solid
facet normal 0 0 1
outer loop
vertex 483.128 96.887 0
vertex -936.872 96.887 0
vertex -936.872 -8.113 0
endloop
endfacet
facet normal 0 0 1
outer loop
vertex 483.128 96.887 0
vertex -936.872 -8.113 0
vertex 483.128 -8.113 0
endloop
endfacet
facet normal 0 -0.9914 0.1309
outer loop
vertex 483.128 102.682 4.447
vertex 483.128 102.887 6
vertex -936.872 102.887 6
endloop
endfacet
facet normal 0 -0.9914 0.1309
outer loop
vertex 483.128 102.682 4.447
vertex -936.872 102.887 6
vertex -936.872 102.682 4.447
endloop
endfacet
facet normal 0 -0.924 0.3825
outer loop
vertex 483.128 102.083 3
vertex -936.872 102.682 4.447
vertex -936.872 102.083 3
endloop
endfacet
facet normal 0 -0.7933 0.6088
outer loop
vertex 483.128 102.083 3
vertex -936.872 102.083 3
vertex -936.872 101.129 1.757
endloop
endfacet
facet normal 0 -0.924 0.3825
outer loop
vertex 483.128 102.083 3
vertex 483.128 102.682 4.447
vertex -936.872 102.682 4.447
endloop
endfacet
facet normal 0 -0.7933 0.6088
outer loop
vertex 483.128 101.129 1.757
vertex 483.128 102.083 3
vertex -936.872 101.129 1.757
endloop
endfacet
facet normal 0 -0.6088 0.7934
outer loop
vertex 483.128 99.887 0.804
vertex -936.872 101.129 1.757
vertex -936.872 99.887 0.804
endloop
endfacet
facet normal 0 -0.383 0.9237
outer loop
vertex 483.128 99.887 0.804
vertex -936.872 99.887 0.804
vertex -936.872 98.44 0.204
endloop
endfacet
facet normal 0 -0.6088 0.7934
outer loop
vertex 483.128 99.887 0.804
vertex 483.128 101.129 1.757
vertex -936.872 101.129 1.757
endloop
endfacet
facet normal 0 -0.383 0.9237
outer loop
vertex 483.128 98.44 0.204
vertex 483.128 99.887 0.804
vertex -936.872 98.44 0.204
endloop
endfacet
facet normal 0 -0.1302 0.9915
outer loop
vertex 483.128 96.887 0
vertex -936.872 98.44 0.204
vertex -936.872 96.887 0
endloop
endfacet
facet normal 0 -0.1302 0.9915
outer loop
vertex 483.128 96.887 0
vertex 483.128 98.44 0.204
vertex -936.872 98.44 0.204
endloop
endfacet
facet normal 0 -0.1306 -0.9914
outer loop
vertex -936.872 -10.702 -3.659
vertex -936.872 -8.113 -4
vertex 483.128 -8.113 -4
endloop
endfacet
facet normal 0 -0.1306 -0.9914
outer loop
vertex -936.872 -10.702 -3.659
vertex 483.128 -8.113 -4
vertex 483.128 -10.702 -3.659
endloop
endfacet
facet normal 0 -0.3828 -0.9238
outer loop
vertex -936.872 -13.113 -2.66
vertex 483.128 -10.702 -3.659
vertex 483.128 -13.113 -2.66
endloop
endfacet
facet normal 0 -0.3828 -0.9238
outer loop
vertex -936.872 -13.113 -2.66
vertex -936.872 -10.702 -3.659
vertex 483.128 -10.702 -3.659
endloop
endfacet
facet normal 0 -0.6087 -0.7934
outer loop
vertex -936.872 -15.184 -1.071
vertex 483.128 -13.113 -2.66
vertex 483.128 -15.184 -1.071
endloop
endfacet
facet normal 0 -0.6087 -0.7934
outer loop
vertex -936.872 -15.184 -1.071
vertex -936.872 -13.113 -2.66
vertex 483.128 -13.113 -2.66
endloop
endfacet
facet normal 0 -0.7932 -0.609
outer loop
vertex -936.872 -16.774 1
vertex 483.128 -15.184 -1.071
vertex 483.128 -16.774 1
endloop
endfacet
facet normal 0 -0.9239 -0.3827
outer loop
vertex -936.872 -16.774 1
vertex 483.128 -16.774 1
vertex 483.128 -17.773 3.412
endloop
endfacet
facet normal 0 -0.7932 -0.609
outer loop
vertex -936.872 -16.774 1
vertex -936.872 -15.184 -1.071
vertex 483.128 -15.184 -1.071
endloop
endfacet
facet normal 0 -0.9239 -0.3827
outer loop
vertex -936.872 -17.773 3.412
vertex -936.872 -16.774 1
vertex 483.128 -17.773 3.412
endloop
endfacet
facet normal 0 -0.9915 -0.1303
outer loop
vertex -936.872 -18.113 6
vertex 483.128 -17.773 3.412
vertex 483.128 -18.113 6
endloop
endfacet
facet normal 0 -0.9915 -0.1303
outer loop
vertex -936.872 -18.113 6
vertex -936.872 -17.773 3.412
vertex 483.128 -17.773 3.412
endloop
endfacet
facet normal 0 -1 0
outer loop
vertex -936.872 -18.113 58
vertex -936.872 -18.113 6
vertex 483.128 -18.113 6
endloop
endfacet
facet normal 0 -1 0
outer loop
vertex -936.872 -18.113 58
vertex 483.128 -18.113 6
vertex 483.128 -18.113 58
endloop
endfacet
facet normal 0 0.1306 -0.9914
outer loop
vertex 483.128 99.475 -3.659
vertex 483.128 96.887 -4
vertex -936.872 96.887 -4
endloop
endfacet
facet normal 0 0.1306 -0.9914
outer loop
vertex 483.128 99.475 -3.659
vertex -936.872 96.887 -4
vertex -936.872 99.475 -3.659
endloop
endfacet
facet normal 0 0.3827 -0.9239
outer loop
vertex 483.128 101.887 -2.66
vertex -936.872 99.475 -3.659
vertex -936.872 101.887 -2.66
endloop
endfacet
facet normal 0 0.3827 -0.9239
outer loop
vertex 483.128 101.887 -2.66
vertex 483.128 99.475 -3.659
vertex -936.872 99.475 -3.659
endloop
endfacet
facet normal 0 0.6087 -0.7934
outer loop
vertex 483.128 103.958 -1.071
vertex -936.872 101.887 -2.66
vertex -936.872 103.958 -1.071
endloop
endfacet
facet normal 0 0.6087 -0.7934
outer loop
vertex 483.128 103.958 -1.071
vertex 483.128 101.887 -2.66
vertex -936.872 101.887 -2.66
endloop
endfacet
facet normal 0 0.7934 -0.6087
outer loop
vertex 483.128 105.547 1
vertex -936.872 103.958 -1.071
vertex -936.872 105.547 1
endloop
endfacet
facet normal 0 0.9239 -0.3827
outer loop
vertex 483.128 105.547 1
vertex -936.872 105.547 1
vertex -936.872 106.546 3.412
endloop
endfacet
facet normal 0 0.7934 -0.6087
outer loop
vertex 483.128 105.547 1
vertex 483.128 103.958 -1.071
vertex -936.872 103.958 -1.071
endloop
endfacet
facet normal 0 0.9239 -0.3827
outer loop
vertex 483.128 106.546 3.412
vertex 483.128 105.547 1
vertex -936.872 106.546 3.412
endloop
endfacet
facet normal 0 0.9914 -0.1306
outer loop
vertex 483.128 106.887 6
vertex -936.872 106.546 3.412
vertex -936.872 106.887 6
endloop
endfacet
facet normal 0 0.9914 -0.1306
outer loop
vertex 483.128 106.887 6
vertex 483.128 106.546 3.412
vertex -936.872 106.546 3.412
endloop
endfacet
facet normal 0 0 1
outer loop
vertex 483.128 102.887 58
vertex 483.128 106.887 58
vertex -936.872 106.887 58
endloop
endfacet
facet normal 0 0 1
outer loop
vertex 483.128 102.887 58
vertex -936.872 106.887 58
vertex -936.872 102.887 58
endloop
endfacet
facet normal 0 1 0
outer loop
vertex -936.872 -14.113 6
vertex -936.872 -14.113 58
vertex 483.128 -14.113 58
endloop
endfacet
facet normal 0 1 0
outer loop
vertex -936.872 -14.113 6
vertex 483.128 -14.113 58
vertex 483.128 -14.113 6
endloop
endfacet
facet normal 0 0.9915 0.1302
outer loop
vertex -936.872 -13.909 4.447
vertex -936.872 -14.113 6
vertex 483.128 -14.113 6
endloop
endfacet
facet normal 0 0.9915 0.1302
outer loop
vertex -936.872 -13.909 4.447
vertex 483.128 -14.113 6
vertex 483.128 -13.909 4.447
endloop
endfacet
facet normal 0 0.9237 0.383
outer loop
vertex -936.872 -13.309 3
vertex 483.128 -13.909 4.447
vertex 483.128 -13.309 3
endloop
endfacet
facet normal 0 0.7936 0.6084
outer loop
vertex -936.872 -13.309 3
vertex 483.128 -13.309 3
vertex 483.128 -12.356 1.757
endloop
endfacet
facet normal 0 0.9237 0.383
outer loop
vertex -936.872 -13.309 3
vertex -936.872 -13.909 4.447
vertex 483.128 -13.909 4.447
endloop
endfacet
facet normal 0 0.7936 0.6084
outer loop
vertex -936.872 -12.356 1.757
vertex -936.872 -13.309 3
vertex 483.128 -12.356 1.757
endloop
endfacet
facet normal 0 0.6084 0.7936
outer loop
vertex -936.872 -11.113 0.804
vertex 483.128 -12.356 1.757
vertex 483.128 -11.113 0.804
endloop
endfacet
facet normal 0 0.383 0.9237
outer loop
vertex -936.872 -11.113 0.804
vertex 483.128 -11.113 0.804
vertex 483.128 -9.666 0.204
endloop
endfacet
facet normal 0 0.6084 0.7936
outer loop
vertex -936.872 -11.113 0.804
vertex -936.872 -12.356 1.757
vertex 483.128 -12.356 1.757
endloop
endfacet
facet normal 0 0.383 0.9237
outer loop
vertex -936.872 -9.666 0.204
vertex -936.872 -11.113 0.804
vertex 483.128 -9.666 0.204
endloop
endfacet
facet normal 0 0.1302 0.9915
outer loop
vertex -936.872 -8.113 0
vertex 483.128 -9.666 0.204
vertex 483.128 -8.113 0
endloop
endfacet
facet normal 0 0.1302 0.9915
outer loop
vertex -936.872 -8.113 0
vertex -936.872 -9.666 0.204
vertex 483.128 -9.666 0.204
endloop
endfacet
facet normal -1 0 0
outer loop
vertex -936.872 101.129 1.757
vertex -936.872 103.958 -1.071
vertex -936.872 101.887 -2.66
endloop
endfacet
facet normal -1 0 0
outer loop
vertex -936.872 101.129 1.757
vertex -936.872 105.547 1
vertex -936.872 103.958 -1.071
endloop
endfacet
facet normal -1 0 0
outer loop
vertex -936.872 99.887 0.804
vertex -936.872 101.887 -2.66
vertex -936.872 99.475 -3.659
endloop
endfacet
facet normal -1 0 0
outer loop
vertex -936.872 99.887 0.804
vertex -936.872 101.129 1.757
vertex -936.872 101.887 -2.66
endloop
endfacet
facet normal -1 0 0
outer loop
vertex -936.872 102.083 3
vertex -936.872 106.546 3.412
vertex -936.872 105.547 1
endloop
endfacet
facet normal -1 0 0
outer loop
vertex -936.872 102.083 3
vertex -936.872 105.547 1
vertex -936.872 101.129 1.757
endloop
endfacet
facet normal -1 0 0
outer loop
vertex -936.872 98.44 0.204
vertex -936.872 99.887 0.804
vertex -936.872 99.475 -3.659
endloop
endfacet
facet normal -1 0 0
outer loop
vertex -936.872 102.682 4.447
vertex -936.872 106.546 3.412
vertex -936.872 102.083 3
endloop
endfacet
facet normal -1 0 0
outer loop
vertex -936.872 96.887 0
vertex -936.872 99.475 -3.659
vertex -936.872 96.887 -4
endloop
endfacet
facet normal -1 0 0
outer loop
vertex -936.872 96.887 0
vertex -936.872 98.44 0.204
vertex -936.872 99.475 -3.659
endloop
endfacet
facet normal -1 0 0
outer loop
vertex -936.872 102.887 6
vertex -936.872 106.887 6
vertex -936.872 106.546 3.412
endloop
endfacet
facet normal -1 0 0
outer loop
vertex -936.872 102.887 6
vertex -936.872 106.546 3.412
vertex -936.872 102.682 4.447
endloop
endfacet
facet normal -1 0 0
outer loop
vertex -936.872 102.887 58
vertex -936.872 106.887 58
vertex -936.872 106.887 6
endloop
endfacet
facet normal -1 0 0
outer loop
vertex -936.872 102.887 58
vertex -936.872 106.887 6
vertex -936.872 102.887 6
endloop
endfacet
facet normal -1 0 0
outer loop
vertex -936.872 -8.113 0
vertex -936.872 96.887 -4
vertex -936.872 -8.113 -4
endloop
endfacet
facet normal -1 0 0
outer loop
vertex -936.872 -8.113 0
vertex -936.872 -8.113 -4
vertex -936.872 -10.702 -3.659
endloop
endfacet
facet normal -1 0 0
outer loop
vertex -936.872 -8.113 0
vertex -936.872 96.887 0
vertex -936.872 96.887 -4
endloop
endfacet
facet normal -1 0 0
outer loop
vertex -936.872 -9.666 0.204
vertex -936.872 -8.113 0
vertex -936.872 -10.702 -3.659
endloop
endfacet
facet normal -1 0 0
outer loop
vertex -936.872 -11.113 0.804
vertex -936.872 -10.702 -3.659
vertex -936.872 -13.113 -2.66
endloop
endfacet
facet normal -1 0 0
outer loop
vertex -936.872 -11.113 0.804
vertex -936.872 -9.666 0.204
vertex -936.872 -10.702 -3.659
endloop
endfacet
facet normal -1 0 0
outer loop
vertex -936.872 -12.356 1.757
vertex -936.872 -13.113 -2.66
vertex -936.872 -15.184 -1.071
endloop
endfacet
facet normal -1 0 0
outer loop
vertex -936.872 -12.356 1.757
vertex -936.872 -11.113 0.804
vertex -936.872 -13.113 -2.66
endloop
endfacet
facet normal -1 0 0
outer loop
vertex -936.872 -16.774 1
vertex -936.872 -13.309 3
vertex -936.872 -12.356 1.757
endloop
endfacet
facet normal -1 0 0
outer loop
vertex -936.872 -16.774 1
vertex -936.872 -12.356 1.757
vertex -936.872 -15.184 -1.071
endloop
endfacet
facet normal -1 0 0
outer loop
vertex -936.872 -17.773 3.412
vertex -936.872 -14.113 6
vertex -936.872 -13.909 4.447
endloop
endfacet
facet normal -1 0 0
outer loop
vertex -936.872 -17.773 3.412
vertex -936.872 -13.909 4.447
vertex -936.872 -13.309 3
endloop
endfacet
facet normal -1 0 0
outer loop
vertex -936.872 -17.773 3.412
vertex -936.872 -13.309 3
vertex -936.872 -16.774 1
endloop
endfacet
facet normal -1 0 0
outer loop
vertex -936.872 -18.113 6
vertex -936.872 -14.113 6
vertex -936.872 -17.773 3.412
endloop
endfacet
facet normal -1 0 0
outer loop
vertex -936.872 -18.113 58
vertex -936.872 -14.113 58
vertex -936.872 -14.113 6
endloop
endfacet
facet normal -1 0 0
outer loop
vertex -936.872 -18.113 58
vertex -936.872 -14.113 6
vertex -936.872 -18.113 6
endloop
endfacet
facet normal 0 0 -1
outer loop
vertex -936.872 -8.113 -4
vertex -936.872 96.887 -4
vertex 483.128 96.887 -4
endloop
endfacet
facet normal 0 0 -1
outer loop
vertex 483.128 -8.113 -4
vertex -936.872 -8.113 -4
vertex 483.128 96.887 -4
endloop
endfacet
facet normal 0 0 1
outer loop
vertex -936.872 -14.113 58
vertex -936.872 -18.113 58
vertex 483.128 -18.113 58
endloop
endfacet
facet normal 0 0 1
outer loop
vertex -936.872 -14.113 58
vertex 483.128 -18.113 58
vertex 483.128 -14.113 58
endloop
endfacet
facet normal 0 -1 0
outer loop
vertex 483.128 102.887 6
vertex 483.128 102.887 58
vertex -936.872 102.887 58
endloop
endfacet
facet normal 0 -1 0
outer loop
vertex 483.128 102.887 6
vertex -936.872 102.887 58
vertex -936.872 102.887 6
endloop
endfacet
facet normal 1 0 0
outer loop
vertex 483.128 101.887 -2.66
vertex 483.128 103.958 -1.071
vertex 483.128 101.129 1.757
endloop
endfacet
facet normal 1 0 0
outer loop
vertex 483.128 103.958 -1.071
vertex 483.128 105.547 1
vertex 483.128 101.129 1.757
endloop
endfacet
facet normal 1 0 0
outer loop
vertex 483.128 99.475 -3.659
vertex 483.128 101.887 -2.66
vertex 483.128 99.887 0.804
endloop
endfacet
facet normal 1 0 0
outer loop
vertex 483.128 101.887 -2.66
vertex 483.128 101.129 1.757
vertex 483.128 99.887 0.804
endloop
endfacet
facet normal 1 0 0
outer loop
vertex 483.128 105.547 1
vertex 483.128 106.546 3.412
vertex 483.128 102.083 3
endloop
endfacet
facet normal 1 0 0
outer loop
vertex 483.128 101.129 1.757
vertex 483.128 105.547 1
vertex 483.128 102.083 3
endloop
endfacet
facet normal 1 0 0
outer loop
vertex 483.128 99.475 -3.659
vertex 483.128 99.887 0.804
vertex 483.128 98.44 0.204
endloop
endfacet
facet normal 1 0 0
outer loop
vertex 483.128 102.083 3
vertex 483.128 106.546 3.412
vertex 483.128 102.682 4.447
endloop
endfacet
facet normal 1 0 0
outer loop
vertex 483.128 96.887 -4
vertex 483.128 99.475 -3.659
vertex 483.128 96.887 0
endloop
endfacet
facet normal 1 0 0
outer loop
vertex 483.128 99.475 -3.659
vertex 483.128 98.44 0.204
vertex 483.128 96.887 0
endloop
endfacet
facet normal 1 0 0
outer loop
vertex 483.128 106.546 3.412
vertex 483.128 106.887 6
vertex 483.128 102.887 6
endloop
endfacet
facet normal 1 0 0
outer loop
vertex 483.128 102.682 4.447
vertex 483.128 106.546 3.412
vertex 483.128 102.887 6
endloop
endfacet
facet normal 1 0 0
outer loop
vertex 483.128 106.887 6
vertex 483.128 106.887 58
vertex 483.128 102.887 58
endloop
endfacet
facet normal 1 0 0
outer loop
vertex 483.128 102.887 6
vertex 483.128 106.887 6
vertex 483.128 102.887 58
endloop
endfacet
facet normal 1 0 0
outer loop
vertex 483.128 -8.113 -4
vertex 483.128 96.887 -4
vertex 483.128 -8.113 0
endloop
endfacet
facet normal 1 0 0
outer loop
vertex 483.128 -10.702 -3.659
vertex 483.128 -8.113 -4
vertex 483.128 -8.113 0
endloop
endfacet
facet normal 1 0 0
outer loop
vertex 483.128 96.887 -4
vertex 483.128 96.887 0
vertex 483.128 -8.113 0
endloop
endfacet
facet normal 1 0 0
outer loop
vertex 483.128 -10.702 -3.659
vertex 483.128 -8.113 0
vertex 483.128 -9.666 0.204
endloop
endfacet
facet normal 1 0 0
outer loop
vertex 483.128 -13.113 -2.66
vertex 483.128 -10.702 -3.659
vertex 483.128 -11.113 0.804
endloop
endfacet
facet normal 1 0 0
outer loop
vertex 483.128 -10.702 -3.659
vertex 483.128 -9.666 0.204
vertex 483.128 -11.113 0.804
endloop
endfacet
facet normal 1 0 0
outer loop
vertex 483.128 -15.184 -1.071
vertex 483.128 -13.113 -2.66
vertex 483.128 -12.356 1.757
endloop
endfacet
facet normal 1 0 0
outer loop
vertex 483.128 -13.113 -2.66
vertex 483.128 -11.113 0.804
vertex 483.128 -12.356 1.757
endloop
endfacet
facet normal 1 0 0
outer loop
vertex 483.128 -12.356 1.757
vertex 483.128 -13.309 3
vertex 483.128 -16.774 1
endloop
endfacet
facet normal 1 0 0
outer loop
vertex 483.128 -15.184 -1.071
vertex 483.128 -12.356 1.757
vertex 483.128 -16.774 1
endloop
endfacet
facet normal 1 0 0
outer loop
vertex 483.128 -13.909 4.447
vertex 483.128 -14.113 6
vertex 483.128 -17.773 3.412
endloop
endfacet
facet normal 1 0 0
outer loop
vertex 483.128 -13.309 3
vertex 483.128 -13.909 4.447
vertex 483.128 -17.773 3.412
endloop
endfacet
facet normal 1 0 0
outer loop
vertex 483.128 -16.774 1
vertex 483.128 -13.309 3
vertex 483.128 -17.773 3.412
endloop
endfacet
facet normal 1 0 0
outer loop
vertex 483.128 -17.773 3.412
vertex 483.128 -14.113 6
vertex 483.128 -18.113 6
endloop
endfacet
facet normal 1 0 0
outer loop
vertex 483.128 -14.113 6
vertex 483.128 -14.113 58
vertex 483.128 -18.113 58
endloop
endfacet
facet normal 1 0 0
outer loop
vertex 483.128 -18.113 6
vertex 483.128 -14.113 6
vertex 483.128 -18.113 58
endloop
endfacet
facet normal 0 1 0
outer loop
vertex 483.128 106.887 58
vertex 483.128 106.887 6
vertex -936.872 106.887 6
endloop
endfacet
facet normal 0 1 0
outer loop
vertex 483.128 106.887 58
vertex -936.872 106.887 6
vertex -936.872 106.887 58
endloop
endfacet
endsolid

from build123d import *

# Parameters (mm, degrees)
SKETCH1_W                    = 1420
SKETCH1_H                    = 125
BASE_FLANGE1_DEPTH           = 4
EDGE_FLANGE1_STRIP_W         = 28
EDGE_FLANGE1_STRIP_H         = 4
EDGE_FLANGE1_STRIP_CUT_DEPTH = 1420
EDGE_FLANGE1_DEPTH           = 1420
EDGE_FLANGE2_STRIP_W         = 28
EDGE_FLANGE2_STRIP_H         = 4
EDGE_FLANGE2_STRIP_CUT_DEPTH = 1420
EDGE_FLANGE2_DEPTH           = 1420


# Sheet-metal steps are written as plain solids
with BuildPart() as part:
    # Sketch1 → Base-Flange1 (new body)
    with BuildSketch(Plane.XY):
        with Locations((-226.8723099, 44.386657102)):
            Rectangle(SKETCH1_W, SKETCH1_H)
    extrude(amount=-BASE_FLANGE1_DEPTH)

    # Edge-Flange1 strip (across the edge) → Edge-Flange1 strip cut (cut)
    with BuildSketch(Plane(origin=(483.1276901, 106.886657102, 0), x_dir=(0, -1, 0), z_dir=(-1, 0, 0))):
        with Locations((-4, -2)):
            Rectangle(EDGE_FLANGE1_STRIP_W, EDGE_FLANGE1_STRIP_H)
    extrude(amount=EDGE_FLANGE1_STRIP_CUT_DEPTH, mode=Mode.SUBTRACT)

    # Edge-Flange1 section (across the edge) → Edge-Flange1 (add)
    with BuildSketch(Plane(origin=(483.1276901, 106.886657102, 0), x_dir=(0, -1, 0), z_dir=(-1, 0, 0))):
        with BuildLine():
            Line((0, 6), (0, 58))
            Line((0, 58), (4, 58))
            Line((4, 58), (4, 6))
            ThreePointArc((4, 6), (5.757359313, 1.757359313), (10, 0))
            Line((10, 0), (10, -4))
            ThreePointArc((10, -4), (2.928932188, -1.071067812), (0, 6))
        make_face()
    extrude(amount=EDGE_FLANGE1_DEPTH)

    # Edge-Flange2 strip (across the edge) → Edge-Flange2 strip cut (cut)
    with BuildSketch(Plane(origin=(-936.8723099, -18.113342898, 0), x_dir=(0, 1, 0), z_dir=(1, 0, 0))):
        with Locations((-4, -2)):
            Rectangle(EDGE_FLANGE2_STRIP_W, EDGE_FLANGE2_STRIP_H)
    extrude(amount=EDGE_FLANGE2_STRIP_CUT_DEPTH, mode=Mode.SUBTRACT)

    # Edge-Flange2 section (across the edge) → Edge-Flange2 (add)
    with BuildSketch(Plane(origin=(-936.8723099, -18.113342898, 0), x_dir=(0, 1, 0), z_dir=(1, 0, 0))):
        with BuildLine():
            Line((0, 6), (0, 58))
            Line((0, 58), (4, 58))
            Line((4, 58), (4, 6))
            ThreePointArc((4, 6), (5.757359313, 1.757359313), (10, 0))
            Line((10, 0), (10, -4))
            ThreePointArc((10, -4), (2.928932188, -1.071067812), (0, 6))
        make_face()
    extrude(amount=EDGE_FLANGE2_DEPTH)


solid = part.part
